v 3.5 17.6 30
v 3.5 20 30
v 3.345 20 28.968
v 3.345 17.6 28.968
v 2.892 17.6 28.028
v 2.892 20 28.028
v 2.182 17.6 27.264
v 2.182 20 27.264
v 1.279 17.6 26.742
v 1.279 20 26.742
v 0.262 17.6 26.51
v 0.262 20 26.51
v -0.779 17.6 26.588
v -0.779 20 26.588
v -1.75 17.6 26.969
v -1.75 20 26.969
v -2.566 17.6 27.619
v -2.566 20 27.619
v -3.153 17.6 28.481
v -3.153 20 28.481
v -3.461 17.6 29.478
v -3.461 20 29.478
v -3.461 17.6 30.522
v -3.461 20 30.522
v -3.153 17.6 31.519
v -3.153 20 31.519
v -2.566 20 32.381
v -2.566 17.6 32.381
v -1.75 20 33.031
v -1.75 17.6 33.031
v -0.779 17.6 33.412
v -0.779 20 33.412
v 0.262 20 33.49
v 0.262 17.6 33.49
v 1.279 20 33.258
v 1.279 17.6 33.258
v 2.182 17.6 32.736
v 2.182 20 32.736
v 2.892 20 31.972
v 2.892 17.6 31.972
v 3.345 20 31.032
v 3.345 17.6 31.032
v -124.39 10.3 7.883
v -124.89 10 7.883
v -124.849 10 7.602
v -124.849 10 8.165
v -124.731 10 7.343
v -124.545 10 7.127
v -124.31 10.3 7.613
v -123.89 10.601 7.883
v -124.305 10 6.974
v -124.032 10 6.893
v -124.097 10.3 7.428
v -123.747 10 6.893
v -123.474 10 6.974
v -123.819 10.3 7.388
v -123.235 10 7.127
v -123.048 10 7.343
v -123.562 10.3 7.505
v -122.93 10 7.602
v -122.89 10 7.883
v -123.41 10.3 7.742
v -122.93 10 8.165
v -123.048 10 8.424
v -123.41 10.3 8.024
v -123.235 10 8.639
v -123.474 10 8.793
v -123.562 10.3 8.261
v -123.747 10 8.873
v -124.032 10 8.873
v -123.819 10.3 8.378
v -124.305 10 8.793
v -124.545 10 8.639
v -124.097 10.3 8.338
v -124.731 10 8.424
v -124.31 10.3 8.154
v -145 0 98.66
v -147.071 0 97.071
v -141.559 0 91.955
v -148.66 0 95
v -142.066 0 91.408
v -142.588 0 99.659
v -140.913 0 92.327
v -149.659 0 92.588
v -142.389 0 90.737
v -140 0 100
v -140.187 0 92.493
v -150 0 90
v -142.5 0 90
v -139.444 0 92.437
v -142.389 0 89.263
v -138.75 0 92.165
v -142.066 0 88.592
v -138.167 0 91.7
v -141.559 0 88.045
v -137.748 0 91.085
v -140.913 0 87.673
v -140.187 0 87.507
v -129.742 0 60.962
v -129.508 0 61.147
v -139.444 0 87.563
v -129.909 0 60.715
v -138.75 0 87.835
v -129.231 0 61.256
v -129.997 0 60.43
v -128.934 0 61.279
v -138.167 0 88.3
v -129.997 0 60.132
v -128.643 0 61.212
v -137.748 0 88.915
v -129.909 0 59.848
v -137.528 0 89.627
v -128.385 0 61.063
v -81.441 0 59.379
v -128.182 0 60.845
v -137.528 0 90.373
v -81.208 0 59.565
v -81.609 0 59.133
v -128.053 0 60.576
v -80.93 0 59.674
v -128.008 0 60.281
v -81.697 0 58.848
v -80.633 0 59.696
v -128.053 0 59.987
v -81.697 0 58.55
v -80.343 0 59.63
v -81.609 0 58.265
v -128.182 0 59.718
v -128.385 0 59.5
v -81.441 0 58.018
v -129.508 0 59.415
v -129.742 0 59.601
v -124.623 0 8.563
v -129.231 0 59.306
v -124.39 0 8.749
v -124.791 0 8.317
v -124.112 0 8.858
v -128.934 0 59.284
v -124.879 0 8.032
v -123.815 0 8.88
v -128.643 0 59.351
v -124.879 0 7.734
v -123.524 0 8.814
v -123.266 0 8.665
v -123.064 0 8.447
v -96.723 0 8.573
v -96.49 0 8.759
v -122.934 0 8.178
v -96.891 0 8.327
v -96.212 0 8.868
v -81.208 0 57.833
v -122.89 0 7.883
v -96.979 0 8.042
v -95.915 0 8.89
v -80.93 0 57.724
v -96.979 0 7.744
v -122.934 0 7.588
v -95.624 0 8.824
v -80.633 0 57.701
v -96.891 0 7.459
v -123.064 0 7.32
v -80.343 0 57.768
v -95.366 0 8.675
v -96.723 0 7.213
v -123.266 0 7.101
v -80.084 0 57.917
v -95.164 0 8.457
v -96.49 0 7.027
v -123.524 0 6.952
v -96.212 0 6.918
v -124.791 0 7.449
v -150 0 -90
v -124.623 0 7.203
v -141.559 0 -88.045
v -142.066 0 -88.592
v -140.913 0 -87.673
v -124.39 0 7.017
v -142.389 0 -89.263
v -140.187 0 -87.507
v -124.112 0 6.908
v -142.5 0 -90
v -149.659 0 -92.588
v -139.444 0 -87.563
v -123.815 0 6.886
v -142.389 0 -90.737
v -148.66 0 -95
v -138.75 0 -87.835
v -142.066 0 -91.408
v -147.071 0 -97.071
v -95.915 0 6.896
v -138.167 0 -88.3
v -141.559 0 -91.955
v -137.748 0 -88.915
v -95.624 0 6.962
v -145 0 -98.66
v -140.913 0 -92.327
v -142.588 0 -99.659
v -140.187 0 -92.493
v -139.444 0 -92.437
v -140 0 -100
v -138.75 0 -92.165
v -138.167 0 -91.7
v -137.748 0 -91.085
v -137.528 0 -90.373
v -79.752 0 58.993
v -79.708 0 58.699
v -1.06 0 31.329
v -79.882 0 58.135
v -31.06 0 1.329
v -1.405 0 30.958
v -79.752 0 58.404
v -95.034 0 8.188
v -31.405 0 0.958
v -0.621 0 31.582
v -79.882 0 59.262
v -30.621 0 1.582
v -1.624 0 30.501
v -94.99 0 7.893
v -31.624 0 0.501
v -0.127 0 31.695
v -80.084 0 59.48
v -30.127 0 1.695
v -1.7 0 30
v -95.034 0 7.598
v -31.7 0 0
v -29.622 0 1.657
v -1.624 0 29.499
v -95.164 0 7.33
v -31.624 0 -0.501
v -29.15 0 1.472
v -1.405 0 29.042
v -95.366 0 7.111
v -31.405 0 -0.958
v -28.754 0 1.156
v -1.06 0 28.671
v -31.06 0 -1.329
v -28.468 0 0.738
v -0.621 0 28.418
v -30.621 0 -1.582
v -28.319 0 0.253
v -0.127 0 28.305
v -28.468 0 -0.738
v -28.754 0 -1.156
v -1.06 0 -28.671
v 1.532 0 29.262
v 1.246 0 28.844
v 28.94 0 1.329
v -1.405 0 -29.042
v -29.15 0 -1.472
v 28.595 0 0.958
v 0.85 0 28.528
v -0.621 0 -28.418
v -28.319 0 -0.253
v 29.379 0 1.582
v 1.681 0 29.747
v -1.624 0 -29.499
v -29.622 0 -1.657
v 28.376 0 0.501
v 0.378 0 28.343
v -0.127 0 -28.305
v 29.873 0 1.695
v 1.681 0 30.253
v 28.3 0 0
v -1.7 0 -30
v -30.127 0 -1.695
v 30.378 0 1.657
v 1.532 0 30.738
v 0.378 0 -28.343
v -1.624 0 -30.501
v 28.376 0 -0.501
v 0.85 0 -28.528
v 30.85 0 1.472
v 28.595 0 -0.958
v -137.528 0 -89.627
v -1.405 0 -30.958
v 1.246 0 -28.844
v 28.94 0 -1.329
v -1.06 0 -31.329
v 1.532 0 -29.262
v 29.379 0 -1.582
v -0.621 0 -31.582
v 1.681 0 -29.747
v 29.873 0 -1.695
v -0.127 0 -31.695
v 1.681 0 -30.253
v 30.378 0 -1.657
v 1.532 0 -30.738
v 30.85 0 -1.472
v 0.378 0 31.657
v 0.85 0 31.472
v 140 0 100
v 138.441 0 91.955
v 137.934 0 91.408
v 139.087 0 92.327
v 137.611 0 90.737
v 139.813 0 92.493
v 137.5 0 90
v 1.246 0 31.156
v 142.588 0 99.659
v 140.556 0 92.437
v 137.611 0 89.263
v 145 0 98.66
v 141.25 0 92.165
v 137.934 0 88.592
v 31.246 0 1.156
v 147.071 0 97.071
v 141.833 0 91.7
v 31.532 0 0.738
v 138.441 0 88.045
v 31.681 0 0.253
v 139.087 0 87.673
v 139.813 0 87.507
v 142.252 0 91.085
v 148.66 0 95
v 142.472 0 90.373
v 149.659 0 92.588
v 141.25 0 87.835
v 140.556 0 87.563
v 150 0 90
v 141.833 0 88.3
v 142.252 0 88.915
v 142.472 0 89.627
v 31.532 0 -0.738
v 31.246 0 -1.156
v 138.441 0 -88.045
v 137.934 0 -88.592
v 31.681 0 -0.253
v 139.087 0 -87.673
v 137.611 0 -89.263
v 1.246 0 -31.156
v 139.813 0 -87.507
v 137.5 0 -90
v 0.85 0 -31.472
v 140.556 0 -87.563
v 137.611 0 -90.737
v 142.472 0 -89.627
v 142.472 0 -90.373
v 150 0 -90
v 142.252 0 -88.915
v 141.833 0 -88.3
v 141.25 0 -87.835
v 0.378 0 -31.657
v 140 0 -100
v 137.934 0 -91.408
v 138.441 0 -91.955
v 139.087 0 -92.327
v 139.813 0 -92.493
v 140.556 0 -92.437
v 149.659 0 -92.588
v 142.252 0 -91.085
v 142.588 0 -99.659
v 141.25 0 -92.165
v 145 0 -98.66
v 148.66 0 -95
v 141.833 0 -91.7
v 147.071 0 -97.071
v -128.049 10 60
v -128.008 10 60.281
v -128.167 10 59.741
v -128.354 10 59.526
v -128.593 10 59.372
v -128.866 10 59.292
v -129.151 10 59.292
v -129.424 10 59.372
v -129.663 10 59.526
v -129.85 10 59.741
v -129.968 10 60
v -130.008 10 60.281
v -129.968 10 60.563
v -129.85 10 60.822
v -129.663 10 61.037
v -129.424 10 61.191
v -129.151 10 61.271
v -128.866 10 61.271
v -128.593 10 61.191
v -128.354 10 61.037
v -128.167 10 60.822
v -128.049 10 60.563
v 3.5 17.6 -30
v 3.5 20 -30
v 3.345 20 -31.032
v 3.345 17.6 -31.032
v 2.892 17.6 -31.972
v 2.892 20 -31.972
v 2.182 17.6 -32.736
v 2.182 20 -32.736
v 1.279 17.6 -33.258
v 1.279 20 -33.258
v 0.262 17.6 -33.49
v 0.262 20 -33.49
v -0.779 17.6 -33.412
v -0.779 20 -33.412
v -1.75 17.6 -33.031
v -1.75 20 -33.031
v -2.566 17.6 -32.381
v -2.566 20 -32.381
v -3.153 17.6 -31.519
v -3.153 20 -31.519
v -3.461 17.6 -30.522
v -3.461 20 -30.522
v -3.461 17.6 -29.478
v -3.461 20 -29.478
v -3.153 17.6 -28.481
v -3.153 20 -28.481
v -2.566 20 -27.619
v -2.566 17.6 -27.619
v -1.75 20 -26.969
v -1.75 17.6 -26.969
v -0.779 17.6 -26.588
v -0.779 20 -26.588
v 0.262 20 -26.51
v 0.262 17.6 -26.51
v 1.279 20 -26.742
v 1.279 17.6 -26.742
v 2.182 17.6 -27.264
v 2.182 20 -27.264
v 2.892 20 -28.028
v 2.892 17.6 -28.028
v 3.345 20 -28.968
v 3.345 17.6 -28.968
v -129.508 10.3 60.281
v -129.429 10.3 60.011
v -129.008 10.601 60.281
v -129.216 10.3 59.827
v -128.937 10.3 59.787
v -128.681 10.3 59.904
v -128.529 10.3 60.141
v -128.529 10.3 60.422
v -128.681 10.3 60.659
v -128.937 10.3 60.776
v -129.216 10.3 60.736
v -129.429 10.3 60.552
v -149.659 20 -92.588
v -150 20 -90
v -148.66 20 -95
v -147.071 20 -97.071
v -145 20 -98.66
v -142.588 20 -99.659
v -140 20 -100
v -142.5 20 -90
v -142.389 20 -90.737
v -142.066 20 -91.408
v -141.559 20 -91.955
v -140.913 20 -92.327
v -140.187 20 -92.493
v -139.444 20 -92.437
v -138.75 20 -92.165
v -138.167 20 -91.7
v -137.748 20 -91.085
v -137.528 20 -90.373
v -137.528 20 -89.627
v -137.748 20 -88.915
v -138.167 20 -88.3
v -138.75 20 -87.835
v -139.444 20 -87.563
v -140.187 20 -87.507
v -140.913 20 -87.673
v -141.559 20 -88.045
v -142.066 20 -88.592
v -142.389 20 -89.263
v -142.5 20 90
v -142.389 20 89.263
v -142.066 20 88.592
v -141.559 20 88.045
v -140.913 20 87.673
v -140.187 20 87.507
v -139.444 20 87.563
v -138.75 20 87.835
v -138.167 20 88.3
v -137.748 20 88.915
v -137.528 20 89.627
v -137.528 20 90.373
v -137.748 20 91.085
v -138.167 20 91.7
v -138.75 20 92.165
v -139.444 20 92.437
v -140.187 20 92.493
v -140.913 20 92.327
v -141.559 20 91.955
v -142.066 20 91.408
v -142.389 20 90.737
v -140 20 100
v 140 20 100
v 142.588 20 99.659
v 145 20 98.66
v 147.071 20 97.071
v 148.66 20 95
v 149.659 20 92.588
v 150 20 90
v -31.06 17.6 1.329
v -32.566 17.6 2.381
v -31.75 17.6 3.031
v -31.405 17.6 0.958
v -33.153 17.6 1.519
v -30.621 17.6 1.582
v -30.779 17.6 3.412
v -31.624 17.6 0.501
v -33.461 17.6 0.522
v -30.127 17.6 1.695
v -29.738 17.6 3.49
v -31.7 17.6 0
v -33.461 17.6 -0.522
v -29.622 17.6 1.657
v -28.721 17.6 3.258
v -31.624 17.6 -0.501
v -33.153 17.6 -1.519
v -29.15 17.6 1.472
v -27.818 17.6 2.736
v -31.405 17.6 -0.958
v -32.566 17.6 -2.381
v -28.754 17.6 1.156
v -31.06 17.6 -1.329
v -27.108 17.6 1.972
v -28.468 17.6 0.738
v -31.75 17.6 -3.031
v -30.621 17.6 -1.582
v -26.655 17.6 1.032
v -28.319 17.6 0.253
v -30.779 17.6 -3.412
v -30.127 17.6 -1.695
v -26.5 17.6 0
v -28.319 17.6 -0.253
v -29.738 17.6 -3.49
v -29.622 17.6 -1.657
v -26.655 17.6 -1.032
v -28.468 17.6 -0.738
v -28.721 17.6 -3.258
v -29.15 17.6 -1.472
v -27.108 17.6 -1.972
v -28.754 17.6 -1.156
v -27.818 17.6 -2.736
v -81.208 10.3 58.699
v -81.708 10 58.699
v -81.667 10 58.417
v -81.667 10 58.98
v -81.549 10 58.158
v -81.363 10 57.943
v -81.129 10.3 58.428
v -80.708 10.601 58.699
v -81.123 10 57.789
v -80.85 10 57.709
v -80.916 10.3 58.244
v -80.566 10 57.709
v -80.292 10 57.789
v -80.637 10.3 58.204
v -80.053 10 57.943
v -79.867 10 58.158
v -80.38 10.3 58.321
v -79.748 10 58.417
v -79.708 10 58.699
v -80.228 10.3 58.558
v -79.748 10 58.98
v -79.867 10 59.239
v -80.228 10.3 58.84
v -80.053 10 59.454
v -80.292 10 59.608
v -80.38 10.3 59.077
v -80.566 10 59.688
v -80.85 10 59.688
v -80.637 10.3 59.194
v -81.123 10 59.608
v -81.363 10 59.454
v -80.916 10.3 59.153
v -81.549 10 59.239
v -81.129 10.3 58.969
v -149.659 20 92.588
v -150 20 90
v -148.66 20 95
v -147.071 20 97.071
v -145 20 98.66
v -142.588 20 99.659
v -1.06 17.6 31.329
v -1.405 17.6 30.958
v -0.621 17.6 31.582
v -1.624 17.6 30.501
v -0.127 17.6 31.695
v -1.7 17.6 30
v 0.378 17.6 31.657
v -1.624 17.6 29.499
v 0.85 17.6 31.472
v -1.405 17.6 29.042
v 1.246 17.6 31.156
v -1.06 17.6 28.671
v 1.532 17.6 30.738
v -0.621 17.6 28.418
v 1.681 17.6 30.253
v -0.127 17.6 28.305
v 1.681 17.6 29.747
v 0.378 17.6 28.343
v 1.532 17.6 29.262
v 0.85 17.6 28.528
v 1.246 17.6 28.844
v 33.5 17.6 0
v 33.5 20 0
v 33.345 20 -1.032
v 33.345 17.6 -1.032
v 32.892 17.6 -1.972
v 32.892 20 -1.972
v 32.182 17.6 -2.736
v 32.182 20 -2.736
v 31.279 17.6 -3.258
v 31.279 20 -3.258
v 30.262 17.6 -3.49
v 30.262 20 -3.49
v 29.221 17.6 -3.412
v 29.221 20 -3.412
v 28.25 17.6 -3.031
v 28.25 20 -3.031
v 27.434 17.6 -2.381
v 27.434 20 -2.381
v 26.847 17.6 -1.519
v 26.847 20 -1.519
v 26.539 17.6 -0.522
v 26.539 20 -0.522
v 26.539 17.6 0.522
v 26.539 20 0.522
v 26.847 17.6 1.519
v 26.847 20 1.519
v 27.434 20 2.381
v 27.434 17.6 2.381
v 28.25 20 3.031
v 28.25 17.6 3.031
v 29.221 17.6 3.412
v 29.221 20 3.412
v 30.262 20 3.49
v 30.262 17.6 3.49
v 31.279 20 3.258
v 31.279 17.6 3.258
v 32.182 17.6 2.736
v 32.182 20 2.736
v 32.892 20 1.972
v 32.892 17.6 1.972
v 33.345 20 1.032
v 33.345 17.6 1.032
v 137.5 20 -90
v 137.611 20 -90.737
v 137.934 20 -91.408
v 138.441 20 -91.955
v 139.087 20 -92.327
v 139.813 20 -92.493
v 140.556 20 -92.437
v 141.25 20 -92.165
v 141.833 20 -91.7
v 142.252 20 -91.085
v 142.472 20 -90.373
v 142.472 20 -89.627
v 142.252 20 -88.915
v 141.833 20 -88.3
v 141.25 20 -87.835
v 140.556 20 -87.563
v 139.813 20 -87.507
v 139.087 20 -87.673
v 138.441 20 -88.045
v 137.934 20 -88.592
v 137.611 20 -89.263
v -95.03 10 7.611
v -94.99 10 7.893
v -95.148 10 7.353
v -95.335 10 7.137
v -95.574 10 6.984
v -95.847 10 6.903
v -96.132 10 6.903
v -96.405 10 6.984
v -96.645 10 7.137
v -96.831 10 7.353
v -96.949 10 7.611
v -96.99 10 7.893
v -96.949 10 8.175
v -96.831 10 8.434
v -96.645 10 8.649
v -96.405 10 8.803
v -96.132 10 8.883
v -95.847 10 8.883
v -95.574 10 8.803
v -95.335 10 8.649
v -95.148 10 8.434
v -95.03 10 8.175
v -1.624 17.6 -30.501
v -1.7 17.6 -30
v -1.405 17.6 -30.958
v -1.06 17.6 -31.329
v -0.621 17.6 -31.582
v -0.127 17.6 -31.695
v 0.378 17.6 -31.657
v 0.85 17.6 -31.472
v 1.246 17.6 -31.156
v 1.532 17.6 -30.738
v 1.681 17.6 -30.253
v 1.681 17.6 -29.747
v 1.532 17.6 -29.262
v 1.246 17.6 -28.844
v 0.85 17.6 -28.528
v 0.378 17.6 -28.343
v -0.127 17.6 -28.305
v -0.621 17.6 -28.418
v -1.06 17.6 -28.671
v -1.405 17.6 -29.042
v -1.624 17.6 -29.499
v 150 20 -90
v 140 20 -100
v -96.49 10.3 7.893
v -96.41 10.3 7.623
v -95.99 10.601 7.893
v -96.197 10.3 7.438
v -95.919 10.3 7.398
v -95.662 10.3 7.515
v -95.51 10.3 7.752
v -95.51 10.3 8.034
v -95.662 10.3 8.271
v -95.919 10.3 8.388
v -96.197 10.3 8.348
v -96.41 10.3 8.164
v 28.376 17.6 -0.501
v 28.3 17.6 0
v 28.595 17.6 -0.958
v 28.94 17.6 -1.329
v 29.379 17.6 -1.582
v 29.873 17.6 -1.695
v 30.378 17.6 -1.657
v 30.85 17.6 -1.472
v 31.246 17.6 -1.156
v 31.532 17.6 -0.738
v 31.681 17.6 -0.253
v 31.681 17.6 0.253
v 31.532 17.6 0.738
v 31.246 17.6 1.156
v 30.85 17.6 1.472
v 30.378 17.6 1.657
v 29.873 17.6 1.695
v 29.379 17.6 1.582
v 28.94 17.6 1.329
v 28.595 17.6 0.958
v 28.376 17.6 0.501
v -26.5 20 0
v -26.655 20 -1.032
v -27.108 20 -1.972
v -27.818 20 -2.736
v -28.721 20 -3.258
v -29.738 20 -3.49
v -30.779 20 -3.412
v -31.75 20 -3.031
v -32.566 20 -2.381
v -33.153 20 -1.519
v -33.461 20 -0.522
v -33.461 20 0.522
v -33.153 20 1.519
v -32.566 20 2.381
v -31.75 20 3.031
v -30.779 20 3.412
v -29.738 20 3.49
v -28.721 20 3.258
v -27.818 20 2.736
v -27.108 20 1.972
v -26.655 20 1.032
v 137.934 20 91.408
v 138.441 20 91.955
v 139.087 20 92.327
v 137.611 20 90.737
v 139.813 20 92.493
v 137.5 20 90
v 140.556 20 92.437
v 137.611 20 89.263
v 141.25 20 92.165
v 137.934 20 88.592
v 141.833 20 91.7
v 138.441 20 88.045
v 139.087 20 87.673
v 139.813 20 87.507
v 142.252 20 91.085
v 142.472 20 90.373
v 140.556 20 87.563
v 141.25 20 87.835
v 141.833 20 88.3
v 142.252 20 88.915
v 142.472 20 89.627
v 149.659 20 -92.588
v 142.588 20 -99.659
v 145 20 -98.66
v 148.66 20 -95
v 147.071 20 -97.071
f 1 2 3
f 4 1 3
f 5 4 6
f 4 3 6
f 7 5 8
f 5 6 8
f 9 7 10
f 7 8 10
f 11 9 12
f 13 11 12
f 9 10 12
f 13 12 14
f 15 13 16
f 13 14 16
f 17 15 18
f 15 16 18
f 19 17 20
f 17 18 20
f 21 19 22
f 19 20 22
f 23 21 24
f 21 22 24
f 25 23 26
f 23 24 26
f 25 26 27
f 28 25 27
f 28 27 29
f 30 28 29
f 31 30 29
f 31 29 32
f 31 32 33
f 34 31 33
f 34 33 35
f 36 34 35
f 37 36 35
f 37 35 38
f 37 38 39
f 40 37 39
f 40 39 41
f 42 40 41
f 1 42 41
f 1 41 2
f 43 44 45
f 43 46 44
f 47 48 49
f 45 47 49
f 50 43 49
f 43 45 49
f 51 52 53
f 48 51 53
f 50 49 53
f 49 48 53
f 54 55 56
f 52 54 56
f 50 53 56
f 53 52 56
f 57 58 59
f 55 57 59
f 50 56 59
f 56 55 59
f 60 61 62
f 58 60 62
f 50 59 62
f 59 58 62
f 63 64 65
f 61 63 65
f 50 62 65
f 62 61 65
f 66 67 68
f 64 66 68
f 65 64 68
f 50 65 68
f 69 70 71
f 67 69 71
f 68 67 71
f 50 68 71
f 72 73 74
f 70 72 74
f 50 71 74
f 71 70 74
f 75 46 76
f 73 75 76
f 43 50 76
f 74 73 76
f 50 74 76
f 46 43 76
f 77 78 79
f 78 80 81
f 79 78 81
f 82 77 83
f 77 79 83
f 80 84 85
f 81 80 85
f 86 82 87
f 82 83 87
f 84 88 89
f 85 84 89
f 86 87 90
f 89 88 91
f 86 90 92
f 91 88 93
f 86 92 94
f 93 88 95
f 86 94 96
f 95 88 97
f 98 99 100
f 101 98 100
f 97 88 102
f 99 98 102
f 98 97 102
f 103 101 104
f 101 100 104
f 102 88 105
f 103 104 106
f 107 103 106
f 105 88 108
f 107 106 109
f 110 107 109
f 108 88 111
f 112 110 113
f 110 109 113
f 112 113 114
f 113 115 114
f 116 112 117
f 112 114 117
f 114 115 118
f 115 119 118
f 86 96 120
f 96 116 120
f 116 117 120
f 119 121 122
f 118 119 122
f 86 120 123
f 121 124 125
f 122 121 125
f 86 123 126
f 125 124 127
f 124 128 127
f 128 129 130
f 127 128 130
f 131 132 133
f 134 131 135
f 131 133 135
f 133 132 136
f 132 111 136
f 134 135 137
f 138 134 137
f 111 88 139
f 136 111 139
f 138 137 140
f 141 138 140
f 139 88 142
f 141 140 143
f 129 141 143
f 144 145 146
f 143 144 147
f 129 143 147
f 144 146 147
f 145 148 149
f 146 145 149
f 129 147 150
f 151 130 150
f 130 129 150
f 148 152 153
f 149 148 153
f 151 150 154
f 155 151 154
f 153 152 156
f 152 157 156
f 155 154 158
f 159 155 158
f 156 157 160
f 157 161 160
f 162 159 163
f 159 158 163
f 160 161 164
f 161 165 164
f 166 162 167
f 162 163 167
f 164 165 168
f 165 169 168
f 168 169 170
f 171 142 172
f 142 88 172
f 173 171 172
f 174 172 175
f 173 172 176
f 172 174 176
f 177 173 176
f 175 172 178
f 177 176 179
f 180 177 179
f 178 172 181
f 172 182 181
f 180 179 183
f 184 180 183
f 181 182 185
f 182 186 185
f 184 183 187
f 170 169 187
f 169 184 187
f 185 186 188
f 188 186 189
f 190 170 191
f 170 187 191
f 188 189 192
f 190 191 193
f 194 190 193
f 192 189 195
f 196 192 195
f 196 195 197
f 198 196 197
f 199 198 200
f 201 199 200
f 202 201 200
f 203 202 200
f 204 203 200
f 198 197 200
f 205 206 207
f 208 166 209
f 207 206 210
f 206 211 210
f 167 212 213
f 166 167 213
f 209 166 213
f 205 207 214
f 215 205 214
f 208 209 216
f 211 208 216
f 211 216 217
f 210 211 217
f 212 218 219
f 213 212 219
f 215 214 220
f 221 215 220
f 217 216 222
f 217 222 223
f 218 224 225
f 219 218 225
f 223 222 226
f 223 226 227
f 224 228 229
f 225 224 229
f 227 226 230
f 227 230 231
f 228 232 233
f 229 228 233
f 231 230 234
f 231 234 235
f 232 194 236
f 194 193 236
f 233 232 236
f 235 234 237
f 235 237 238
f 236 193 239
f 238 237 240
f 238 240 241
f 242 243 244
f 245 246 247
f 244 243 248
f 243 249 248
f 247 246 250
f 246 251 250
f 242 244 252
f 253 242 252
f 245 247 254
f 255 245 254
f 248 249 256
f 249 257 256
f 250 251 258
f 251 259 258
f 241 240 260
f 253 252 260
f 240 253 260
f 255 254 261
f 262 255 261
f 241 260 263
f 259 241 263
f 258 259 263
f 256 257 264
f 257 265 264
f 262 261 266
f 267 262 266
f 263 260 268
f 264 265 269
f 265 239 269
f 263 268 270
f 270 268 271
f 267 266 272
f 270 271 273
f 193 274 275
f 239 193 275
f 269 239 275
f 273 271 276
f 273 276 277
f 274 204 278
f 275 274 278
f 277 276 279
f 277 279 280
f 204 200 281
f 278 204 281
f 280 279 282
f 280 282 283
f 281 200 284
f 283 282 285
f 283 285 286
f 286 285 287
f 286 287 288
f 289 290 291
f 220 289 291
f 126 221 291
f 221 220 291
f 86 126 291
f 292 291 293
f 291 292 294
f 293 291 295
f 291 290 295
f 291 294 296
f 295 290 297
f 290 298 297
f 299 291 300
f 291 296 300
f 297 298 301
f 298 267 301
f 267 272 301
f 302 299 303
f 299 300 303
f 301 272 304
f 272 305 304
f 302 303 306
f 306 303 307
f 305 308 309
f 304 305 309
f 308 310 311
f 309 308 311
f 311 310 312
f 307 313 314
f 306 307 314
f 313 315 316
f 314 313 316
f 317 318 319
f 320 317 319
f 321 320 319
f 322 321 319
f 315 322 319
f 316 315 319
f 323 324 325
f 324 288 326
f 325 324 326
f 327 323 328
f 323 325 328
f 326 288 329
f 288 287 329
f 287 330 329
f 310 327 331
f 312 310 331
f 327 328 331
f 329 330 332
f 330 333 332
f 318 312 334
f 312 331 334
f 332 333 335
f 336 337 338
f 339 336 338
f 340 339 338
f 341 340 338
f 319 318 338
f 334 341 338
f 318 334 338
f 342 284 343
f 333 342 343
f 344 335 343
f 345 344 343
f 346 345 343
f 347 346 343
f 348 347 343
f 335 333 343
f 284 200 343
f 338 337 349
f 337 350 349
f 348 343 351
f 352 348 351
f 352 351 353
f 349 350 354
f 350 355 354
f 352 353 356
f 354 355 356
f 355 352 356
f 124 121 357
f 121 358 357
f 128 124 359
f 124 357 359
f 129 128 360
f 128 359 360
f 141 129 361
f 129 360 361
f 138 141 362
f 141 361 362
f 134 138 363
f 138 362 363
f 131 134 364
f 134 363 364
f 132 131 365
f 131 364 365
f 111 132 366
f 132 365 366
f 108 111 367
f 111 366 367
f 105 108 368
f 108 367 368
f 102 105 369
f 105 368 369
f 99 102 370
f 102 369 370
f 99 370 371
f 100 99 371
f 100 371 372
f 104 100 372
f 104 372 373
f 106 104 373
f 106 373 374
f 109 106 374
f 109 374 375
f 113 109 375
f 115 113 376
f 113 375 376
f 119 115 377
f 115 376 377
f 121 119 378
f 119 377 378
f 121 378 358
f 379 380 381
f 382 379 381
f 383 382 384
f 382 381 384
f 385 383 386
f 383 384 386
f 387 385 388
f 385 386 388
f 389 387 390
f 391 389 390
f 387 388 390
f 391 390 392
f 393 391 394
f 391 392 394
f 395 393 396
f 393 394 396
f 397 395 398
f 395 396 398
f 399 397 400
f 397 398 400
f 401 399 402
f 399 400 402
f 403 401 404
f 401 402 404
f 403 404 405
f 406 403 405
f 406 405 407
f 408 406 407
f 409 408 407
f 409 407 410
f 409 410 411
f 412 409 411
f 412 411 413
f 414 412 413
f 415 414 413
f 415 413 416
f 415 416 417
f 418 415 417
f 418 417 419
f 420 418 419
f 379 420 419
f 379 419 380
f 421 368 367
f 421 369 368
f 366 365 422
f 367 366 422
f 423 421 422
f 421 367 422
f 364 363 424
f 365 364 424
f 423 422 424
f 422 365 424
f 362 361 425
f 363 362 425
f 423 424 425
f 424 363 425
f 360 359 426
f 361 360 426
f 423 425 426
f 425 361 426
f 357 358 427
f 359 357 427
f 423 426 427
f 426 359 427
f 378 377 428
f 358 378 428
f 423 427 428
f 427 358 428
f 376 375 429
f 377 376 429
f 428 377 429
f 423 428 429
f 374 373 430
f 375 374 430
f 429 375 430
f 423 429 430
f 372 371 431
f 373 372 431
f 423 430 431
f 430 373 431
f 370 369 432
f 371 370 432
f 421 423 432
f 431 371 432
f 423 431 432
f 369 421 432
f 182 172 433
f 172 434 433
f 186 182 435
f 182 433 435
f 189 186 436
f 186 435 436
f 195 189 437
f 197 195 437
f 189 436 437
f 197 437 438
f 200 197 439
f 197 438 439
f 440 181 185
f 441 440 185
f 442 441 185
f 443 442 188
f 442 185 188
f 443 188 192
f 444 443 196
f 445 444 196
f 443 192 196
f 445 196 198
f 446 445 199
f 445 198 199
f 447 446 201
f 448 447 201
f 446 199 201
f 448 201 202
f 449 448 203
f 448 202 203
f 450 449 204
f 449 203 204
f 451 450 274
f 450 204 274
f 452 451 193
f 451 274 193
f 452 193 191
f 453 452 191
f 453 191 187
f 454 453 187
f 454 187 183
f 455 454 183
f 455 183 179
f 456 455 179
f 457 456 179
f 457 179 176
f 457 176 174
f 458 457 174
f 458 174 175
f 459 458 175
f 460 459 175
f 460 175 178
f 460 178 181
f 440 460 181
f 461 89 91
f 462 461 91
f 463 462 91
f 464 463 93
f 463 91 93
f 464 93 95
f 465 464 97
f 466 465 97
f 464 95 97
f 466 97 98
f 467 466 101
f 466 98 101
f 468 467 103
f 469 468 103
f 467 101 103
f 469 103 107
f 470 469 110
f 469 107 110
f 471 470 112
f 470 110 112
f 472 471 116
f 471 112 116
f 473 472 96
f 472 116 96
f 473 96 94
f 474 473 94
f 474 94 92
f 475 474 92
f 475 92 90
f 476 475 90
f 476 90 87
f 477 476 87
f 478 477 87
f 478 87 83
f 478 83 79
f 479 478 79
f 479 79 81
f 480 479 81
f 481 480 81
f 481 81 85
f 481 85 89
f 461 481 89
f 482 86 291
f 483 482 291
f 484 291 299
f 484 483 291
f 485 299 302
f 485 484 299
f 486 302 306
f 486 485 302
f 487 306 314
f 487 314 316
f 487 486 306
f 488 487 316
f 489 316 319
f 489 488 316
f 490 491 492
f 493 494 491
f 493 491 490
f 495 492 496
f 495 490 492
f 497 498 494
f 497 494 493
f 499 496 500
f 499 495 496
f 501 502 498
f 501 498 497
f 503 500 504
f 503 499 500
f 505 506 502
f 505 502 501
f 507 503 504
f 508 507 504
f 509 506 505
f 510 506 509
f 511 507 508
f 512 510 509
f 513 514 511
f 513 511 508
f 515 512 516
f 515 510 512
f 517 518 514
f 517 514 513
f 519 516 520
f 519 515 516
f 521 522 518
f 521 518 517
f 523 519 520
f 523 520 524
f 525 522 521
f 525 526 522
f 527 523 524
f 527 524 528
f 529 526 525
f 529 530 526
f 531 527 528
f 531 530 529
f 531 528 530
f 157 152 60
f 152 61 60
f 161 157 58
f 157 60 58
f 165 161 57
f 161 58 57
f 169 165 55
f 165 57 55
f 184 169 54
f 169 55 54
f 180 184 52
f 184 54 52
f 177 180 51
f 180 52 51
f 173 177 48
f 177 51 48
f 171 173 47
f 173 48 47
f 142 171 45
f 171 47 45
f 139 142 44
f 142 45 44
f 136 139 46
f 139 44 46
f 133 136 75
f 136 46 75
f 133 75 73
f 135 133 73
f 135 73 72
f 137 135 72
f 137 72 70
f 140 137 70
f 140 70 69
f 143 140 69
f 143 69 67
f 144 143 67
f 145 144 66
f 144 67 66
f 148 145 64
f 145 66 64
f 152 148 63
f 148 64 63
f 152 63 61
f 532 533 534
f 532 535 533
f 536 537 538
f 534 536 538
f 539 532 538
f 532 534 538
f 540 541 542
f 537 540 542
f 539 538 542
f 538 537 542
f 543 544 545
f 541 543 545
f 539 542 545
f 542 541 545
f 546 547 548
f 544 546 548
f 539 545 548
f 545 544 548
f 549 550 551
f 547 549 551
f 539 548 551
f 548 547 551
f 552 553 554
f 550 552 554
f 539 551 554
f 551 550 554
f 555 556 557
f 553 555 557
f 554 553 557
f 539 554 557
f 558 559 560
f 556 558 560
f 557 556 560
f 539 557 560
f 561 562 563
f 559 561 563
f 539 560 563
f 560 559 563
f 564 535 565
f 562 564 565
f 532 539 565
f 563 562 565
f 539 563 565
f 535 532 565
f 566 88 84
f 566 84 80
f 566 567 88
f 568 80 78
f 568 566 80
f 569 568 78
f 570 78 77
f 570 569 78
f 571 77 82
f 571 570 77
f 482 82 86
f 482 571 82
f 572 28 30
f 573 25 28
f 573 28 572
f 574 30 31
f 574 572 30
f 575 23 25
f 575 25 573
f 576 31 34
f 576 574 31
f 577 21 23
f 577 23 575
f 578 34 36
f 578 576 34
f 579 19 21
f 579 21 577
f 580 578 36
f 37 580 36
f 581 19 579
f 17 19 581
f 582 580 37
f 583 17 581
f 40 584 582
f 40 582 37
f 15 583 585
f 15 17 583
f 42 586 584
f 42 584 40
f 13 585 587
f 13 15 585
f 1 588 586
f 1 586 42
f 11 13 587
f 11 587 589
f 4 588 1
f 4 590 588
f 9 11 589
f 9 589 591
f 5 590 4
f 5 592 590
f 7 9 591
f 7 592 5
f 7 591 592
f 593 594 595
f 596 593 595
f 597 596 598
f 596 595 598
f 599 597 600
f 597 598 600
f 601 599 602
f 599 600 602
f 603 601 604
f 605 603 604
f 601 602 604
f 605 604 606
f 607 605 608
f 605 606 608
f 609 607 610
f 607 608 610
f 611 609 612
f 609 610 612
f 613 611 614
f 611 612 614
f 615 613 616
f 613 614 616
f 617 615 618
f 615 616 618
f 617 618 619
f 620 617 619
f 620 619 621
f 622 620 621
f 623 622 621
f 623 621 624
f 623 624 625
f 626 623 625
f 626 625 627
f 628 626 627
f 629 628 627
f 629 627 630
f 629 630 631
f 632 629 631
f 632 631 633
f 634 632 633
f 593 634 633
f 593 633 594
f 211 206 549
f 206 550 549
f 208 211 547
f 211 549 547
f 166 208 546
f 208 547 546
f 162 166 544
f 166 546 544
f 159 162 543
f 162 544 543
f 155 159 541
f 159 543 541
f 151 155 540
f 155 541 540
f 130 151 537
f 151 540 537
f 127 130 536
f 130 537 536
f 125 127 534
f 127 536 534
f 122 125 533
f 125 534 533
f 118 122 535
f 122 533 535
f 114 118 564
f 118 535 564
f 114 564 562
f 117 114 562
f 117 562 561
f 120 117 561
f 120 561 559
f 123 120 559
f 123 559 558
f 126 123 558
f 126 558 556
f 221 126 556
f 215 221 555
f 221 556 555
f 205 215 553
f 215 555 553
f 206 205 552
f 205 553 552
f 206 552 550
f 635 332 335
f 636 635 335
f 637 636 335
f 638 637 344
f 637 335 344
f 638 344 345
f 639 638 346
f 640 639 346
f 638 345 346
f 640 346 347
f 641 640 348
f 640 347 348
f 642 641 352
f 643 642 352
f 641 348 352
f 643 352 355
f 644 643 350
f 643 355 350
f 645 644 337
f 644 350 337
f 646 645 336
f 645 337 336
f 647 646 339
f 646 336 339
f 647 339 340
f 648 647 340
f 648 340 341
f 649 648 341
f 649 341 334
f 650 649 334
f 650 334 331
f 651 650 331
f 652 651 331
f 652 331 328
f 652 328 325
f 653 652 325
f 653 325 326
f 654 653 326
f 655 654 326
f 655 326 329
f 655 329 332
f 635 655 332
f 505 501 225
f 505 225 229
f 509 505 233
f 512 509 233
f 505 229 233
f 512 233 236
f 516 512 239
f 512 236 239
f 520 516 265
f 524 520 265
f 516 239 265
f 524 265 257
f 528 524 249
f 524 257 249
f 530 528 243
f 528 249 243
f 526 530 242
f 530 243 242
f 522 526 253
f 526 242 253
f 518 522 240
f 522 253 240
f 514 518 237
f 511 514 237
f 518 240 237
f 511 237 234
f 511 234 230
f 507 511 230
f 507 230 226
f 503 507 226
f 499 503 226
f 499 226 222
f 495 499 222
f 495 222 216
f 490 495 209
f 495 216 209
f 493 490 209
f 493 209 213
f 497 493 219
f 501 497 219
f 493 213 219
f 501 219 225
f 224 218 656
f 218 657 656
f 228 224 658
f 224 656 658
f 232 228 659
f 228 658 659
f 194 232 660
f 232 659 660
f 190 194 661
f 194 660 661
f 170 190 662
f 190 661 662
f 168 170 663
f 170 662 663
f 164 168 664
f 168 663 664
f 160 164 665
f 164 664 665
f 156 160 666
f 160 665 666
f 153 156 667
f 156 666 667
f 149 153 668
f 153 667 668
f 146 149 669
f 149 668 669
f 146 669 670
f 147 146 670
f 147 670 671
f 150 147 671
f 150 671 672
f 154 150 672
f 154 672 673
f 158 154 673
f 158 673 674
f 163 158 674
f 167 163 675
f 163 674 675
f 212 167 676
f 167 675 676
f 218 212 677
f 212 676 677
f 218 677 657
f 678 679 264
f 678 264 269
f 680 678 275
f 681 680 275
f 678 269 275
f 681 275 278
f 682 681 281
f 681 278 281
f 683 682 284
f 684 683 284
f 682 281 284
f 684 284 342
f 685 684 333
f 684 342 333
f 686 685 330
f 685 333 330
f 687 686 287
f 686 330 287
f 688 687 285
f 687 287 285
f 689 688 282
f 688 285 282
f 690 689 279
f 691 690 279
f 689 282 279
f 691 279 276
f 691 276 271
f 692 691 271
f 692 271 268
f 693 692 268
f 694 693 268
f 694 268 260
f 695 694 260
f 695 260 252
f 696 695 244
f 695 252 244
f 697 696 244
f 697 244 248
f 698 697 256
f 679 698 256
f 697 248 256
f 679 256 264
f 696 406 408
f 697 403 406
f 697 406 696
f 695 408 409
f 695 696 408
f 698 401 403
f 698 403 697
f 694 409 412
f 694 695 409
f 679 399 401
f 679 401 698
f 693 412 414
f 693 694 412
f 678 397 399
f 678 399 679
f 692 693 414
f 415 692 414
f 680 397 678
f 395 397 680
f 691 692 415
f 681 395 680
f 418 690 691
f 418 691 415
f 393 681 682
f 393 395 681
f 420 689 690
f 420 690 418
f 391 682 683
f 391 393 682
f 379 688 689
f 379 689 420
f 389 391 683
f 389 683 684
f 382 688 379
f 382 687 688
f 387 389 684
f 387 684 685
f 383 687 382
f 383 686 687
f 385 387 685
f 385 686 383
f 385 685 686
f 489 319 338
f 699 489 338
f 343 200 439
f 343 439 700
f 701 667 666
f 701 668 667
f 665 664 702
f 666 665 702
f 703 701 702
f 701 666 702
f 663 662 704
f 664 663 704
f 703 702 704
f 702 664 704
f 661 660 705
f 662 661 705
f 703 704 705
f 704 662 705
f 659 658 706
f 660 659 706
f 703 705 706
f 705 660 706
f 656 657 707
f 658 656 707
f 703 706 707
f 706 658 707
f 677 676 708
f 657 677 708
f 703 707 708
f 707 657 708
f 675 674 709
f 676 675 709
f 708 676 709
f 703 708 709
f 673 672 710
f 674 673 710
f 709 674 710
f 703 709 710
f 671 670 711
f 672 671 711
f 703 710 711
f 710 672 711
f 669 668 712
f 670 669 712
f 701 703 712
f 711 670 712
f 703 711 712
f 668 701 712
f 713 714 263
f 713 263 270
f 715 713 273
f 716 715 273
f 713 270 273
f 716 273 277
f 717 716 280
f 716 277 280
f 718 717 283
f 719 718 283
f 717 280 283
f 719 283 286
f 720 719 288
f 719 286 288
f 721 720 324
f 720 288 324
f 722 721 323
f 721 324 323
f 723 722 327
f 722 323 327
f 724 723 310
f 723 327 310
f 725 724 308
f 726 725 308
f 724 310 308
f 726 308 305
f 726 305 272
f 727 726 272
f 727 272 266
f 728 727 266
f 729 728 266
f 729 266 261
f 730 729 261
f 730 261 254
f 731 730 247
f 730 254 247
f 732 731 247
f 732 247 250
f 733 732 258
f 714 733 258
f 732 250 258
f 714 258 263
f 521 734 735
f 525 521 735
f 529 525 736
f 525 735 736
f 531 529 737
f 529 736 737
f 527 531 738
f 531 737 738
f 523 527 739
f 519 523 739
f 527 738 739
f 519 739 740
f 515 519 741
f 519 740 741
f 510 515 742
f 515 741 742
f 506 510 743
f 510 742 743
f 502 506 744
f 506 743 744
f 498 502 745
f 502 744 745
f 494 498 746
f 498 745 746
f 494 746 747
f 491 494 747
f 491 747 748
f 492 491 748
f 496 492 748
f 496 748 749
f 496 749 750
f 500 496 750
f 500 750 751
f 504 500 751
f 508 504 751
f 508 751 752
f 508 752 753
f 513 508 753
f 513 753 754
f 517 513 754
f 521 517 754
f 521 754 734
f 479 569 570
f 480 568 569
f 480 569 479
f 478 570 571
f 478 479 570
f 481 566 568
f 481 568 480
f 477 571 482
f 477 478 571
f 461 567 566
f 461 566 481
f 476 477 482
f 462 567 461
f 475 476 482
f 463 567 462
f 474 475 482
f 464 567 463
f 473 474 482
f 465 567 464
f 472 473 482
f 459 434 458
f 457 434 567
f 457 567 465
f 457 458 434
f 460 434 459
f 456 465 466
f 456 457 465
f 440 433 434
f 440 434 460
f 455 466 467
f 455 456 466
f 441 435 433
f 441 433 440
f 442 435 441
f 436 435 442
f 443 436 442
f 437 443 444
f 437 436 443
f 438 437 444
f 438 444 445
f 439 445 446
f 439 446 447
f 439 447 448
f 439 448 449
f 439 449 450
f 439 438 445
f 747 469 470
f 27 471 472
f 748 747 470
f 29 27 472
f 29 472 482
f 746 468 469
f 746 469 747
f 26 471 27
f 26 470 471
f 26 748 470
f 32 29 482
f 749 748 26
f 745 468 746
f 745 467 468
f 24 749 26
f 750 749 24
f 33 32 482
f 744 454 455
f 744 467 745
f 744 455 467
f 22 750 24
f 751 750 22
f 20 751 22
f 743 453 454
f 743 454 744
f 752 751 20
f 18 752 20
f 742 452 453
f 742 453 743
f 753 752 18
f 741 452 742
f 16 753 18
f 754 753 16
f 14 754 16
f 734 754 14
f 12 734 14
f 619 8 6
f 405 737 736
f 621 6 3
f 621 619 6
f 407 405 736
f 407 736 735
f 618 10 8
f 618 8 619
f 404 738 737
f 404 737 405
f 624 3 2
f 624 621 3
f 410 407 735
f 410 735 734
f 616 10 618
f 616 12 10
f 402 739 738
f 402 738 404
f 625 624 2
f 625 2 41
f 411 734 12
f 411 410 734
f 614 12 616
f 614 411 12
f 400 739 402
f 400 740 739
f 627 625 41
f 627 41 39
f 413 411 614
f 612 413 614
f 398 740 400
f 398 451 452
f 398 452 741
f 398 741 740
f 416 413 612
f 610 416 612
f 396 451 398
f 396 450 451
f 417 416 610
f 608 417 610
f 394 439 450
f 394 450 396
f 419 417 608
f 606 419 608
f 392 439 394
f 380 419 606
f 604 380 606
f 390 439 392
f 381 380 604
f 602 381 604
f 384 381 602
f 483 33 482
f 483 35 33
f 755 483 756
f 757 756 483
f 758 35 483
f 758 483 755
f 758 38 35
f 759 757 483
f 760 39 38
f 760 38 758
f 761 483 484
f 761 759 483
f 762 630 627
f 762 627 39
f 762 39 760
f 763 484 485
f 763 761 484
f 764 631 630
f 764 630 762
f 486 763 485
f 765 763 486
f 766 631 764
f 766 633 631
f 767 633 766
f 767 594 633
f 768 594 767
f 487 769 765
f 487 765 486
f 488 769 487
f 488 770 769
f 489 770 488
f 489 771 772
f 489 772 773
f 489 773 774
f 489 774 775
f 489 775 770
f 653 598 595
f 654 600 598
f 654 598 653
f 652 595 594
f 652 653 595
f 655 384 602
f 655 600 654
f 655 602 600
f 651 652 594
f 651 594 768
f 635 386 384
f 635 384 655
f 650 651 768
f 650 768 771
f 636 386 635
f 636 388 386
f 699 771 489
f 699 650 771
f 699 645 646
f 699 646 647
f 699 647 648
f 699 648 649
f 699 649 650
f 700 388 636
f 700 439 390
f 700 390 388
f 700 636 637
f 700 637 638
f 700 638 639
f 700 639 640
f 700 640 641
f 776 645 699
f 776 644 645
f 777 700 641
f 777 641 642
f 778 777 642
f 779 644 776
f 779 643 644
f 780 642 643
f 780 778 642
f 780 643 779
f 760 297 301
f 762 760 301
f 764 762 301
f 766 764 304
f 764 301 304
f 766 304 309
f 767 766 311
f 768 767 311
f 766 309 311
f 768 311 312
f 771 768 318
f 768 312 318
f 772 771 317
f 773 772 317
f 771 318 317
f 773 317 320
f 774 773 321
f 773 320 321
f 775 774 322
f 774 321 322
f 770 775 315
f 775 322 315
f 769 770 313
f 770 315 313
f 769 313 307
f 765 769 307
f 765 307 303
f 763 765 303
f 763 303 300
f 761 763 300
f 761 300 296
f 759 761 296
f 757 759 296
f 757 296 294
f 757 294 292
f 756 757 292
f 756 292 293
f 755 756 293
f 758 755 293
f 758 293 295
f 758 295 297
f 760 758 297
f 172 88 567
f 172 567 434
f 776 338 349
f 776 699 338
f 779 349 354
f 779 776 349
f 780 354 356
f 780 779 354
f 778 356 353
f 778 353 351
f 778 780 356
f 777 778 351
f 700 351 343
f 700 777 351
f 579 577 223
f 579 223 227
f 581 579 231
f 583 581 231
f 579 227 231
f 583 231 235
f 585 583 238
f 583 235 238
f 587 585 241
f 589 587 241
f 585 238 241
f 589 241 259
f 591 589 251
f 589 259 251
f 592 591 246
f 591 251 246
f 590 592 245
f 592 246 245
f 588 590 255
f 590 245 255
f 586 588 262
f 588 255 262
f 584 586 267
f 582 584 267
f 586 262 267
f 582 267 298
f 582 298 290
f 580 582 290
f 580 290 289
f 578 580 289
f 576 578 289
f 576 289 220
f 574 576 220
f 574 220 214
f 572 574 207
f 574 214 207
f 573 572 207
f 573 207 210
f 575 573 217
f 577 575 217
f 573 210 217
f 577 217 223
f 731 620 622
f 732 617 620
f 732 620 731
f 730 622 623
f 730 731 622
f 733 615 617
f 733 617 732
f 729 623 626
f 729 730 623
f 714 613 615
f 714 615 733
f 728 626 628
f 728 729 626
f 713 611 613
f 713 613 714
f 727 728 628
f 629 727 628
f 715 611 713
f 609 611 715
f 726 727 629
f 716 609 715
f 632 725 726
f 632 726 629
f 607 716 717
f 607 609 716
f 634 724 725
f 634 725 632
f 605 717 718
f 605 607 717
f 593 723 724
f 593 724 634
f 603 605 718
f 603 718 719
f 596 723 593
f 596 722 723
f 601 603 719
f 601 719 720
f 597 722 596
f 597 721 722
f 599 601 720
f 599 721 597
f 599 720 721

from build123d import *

# Parameters (mm, degrees)
SKETCH1_W                                        = 300
SKETCH1_H                                        = 200
BOSS_EXTRUDE1_DEPTH                              = 20
FILLET1_R                                        = 10
CBORE_FOR_M3_PAN_HEAD_MACHINE_SCREW1_D           = 3.4
CBORE_FOR_M3_PAN_HEAD_MACHINE_SCREW1_CBORE_D     = 7
CBORE_FOR_M3_PAN_HEAD_MACHINE_SCREW1_CBORE_DEPTH = 2.4
F_5_0_5_DIAMETER_HOLE1_D                         = 5
F_2_0_2_DIAMETER_HOLE1_D                         = 2
F_2_0_2_DIAMETER_HOLE1_DEPTH                     = 10
F_2_0_2_DIAMETER_HOLE1_TIP                       = 0.600860619


with BuildPart() as part:
    # Sketch1 → Boss-Extrude1 (new body)
    with BuildSketch(Plane(origin=(0, 0, 0), x_dir=(1, 0, 0), z_dir=(0, 1, 0))):
        Rectangle(SKETCH1_W, SKETCH1_H)
    extrude(amount=BOSS_EXTRUDE1_DEPTH)

    # Fillet1
    fillet1_edges = [part.edges().sort_by_distance(p)[0] for p in [
        (-150, 10, -100),
        (150, 10, -100),
        (150, 10, 100),
        (-150, 10, 100),
    ]]
    fillet(fillet1_edges, radius=FILLET1_R)

    # CBORE for M3 Pan Head Machine Screw1 (through all)
    with Locations(Plane(origin=(0, 20, 0), x_dir=(1, 0, 0), z_dir=(0, 1, 0))):
        with Locations((-30, 0), (0, -30), (30, 0), (0, 30)):
            CounterBoreHole(CBORE_FOR_M3_PAN_HEAD_MACHINE_SCREW1_D / 2, CBORE_FOR_M3_PAN_HEAD_MACHINE_SCREW1_CBORE_D / 2, CBORE_FOR_M3_PAN_HEAD_MACHINE_SCREW1_CBORE_DEPTH)

    # Ø5.0 (5) Diameter Hole1 (through all)
    with Locations(Plane(origin=(0, 20, 0), x_dir=(1, 0, 0), z_dir=(0, 1, 0))):
        with Locations((-140, 90), (140, 90), (140, -90), (-140, -90)):
            Hole(F_5_0_5_DIAMETER_HOLE1_D / 2)

    # Ø2.0 (2) Diameter Hole1
    with Locations(Plane(origin=(0, 0, 0), x_dir=(-1, 0, 0), z_dir=(0, -1, 0))):
        with Locations((129.008456627, -60.281417871), (123.889747092, -7.883242209), (95.98974887, -7.893204139), (80.707888413, -58.698663894)):
            Hole(F_2_0_2_DIAMETER_HOLE1_D / 2, depth=F_2_0_2_DIAMETER_HOLE1_DEPTH)
            with Locations((0, 0, -(F_2_0_2_DIAMETER_HOLE1_DEPTH + F_2_0_2_DIAMETER_HOLE1_TIP / 2))):  # 118° drill point
                Cone(0, F_2_0_2_DIAMETER_HOLE1_D / 2, F_2_0_2_DIAMETER_HOLE1_TIP, mode=Mode.SUBTRACT)


solid = part.part
